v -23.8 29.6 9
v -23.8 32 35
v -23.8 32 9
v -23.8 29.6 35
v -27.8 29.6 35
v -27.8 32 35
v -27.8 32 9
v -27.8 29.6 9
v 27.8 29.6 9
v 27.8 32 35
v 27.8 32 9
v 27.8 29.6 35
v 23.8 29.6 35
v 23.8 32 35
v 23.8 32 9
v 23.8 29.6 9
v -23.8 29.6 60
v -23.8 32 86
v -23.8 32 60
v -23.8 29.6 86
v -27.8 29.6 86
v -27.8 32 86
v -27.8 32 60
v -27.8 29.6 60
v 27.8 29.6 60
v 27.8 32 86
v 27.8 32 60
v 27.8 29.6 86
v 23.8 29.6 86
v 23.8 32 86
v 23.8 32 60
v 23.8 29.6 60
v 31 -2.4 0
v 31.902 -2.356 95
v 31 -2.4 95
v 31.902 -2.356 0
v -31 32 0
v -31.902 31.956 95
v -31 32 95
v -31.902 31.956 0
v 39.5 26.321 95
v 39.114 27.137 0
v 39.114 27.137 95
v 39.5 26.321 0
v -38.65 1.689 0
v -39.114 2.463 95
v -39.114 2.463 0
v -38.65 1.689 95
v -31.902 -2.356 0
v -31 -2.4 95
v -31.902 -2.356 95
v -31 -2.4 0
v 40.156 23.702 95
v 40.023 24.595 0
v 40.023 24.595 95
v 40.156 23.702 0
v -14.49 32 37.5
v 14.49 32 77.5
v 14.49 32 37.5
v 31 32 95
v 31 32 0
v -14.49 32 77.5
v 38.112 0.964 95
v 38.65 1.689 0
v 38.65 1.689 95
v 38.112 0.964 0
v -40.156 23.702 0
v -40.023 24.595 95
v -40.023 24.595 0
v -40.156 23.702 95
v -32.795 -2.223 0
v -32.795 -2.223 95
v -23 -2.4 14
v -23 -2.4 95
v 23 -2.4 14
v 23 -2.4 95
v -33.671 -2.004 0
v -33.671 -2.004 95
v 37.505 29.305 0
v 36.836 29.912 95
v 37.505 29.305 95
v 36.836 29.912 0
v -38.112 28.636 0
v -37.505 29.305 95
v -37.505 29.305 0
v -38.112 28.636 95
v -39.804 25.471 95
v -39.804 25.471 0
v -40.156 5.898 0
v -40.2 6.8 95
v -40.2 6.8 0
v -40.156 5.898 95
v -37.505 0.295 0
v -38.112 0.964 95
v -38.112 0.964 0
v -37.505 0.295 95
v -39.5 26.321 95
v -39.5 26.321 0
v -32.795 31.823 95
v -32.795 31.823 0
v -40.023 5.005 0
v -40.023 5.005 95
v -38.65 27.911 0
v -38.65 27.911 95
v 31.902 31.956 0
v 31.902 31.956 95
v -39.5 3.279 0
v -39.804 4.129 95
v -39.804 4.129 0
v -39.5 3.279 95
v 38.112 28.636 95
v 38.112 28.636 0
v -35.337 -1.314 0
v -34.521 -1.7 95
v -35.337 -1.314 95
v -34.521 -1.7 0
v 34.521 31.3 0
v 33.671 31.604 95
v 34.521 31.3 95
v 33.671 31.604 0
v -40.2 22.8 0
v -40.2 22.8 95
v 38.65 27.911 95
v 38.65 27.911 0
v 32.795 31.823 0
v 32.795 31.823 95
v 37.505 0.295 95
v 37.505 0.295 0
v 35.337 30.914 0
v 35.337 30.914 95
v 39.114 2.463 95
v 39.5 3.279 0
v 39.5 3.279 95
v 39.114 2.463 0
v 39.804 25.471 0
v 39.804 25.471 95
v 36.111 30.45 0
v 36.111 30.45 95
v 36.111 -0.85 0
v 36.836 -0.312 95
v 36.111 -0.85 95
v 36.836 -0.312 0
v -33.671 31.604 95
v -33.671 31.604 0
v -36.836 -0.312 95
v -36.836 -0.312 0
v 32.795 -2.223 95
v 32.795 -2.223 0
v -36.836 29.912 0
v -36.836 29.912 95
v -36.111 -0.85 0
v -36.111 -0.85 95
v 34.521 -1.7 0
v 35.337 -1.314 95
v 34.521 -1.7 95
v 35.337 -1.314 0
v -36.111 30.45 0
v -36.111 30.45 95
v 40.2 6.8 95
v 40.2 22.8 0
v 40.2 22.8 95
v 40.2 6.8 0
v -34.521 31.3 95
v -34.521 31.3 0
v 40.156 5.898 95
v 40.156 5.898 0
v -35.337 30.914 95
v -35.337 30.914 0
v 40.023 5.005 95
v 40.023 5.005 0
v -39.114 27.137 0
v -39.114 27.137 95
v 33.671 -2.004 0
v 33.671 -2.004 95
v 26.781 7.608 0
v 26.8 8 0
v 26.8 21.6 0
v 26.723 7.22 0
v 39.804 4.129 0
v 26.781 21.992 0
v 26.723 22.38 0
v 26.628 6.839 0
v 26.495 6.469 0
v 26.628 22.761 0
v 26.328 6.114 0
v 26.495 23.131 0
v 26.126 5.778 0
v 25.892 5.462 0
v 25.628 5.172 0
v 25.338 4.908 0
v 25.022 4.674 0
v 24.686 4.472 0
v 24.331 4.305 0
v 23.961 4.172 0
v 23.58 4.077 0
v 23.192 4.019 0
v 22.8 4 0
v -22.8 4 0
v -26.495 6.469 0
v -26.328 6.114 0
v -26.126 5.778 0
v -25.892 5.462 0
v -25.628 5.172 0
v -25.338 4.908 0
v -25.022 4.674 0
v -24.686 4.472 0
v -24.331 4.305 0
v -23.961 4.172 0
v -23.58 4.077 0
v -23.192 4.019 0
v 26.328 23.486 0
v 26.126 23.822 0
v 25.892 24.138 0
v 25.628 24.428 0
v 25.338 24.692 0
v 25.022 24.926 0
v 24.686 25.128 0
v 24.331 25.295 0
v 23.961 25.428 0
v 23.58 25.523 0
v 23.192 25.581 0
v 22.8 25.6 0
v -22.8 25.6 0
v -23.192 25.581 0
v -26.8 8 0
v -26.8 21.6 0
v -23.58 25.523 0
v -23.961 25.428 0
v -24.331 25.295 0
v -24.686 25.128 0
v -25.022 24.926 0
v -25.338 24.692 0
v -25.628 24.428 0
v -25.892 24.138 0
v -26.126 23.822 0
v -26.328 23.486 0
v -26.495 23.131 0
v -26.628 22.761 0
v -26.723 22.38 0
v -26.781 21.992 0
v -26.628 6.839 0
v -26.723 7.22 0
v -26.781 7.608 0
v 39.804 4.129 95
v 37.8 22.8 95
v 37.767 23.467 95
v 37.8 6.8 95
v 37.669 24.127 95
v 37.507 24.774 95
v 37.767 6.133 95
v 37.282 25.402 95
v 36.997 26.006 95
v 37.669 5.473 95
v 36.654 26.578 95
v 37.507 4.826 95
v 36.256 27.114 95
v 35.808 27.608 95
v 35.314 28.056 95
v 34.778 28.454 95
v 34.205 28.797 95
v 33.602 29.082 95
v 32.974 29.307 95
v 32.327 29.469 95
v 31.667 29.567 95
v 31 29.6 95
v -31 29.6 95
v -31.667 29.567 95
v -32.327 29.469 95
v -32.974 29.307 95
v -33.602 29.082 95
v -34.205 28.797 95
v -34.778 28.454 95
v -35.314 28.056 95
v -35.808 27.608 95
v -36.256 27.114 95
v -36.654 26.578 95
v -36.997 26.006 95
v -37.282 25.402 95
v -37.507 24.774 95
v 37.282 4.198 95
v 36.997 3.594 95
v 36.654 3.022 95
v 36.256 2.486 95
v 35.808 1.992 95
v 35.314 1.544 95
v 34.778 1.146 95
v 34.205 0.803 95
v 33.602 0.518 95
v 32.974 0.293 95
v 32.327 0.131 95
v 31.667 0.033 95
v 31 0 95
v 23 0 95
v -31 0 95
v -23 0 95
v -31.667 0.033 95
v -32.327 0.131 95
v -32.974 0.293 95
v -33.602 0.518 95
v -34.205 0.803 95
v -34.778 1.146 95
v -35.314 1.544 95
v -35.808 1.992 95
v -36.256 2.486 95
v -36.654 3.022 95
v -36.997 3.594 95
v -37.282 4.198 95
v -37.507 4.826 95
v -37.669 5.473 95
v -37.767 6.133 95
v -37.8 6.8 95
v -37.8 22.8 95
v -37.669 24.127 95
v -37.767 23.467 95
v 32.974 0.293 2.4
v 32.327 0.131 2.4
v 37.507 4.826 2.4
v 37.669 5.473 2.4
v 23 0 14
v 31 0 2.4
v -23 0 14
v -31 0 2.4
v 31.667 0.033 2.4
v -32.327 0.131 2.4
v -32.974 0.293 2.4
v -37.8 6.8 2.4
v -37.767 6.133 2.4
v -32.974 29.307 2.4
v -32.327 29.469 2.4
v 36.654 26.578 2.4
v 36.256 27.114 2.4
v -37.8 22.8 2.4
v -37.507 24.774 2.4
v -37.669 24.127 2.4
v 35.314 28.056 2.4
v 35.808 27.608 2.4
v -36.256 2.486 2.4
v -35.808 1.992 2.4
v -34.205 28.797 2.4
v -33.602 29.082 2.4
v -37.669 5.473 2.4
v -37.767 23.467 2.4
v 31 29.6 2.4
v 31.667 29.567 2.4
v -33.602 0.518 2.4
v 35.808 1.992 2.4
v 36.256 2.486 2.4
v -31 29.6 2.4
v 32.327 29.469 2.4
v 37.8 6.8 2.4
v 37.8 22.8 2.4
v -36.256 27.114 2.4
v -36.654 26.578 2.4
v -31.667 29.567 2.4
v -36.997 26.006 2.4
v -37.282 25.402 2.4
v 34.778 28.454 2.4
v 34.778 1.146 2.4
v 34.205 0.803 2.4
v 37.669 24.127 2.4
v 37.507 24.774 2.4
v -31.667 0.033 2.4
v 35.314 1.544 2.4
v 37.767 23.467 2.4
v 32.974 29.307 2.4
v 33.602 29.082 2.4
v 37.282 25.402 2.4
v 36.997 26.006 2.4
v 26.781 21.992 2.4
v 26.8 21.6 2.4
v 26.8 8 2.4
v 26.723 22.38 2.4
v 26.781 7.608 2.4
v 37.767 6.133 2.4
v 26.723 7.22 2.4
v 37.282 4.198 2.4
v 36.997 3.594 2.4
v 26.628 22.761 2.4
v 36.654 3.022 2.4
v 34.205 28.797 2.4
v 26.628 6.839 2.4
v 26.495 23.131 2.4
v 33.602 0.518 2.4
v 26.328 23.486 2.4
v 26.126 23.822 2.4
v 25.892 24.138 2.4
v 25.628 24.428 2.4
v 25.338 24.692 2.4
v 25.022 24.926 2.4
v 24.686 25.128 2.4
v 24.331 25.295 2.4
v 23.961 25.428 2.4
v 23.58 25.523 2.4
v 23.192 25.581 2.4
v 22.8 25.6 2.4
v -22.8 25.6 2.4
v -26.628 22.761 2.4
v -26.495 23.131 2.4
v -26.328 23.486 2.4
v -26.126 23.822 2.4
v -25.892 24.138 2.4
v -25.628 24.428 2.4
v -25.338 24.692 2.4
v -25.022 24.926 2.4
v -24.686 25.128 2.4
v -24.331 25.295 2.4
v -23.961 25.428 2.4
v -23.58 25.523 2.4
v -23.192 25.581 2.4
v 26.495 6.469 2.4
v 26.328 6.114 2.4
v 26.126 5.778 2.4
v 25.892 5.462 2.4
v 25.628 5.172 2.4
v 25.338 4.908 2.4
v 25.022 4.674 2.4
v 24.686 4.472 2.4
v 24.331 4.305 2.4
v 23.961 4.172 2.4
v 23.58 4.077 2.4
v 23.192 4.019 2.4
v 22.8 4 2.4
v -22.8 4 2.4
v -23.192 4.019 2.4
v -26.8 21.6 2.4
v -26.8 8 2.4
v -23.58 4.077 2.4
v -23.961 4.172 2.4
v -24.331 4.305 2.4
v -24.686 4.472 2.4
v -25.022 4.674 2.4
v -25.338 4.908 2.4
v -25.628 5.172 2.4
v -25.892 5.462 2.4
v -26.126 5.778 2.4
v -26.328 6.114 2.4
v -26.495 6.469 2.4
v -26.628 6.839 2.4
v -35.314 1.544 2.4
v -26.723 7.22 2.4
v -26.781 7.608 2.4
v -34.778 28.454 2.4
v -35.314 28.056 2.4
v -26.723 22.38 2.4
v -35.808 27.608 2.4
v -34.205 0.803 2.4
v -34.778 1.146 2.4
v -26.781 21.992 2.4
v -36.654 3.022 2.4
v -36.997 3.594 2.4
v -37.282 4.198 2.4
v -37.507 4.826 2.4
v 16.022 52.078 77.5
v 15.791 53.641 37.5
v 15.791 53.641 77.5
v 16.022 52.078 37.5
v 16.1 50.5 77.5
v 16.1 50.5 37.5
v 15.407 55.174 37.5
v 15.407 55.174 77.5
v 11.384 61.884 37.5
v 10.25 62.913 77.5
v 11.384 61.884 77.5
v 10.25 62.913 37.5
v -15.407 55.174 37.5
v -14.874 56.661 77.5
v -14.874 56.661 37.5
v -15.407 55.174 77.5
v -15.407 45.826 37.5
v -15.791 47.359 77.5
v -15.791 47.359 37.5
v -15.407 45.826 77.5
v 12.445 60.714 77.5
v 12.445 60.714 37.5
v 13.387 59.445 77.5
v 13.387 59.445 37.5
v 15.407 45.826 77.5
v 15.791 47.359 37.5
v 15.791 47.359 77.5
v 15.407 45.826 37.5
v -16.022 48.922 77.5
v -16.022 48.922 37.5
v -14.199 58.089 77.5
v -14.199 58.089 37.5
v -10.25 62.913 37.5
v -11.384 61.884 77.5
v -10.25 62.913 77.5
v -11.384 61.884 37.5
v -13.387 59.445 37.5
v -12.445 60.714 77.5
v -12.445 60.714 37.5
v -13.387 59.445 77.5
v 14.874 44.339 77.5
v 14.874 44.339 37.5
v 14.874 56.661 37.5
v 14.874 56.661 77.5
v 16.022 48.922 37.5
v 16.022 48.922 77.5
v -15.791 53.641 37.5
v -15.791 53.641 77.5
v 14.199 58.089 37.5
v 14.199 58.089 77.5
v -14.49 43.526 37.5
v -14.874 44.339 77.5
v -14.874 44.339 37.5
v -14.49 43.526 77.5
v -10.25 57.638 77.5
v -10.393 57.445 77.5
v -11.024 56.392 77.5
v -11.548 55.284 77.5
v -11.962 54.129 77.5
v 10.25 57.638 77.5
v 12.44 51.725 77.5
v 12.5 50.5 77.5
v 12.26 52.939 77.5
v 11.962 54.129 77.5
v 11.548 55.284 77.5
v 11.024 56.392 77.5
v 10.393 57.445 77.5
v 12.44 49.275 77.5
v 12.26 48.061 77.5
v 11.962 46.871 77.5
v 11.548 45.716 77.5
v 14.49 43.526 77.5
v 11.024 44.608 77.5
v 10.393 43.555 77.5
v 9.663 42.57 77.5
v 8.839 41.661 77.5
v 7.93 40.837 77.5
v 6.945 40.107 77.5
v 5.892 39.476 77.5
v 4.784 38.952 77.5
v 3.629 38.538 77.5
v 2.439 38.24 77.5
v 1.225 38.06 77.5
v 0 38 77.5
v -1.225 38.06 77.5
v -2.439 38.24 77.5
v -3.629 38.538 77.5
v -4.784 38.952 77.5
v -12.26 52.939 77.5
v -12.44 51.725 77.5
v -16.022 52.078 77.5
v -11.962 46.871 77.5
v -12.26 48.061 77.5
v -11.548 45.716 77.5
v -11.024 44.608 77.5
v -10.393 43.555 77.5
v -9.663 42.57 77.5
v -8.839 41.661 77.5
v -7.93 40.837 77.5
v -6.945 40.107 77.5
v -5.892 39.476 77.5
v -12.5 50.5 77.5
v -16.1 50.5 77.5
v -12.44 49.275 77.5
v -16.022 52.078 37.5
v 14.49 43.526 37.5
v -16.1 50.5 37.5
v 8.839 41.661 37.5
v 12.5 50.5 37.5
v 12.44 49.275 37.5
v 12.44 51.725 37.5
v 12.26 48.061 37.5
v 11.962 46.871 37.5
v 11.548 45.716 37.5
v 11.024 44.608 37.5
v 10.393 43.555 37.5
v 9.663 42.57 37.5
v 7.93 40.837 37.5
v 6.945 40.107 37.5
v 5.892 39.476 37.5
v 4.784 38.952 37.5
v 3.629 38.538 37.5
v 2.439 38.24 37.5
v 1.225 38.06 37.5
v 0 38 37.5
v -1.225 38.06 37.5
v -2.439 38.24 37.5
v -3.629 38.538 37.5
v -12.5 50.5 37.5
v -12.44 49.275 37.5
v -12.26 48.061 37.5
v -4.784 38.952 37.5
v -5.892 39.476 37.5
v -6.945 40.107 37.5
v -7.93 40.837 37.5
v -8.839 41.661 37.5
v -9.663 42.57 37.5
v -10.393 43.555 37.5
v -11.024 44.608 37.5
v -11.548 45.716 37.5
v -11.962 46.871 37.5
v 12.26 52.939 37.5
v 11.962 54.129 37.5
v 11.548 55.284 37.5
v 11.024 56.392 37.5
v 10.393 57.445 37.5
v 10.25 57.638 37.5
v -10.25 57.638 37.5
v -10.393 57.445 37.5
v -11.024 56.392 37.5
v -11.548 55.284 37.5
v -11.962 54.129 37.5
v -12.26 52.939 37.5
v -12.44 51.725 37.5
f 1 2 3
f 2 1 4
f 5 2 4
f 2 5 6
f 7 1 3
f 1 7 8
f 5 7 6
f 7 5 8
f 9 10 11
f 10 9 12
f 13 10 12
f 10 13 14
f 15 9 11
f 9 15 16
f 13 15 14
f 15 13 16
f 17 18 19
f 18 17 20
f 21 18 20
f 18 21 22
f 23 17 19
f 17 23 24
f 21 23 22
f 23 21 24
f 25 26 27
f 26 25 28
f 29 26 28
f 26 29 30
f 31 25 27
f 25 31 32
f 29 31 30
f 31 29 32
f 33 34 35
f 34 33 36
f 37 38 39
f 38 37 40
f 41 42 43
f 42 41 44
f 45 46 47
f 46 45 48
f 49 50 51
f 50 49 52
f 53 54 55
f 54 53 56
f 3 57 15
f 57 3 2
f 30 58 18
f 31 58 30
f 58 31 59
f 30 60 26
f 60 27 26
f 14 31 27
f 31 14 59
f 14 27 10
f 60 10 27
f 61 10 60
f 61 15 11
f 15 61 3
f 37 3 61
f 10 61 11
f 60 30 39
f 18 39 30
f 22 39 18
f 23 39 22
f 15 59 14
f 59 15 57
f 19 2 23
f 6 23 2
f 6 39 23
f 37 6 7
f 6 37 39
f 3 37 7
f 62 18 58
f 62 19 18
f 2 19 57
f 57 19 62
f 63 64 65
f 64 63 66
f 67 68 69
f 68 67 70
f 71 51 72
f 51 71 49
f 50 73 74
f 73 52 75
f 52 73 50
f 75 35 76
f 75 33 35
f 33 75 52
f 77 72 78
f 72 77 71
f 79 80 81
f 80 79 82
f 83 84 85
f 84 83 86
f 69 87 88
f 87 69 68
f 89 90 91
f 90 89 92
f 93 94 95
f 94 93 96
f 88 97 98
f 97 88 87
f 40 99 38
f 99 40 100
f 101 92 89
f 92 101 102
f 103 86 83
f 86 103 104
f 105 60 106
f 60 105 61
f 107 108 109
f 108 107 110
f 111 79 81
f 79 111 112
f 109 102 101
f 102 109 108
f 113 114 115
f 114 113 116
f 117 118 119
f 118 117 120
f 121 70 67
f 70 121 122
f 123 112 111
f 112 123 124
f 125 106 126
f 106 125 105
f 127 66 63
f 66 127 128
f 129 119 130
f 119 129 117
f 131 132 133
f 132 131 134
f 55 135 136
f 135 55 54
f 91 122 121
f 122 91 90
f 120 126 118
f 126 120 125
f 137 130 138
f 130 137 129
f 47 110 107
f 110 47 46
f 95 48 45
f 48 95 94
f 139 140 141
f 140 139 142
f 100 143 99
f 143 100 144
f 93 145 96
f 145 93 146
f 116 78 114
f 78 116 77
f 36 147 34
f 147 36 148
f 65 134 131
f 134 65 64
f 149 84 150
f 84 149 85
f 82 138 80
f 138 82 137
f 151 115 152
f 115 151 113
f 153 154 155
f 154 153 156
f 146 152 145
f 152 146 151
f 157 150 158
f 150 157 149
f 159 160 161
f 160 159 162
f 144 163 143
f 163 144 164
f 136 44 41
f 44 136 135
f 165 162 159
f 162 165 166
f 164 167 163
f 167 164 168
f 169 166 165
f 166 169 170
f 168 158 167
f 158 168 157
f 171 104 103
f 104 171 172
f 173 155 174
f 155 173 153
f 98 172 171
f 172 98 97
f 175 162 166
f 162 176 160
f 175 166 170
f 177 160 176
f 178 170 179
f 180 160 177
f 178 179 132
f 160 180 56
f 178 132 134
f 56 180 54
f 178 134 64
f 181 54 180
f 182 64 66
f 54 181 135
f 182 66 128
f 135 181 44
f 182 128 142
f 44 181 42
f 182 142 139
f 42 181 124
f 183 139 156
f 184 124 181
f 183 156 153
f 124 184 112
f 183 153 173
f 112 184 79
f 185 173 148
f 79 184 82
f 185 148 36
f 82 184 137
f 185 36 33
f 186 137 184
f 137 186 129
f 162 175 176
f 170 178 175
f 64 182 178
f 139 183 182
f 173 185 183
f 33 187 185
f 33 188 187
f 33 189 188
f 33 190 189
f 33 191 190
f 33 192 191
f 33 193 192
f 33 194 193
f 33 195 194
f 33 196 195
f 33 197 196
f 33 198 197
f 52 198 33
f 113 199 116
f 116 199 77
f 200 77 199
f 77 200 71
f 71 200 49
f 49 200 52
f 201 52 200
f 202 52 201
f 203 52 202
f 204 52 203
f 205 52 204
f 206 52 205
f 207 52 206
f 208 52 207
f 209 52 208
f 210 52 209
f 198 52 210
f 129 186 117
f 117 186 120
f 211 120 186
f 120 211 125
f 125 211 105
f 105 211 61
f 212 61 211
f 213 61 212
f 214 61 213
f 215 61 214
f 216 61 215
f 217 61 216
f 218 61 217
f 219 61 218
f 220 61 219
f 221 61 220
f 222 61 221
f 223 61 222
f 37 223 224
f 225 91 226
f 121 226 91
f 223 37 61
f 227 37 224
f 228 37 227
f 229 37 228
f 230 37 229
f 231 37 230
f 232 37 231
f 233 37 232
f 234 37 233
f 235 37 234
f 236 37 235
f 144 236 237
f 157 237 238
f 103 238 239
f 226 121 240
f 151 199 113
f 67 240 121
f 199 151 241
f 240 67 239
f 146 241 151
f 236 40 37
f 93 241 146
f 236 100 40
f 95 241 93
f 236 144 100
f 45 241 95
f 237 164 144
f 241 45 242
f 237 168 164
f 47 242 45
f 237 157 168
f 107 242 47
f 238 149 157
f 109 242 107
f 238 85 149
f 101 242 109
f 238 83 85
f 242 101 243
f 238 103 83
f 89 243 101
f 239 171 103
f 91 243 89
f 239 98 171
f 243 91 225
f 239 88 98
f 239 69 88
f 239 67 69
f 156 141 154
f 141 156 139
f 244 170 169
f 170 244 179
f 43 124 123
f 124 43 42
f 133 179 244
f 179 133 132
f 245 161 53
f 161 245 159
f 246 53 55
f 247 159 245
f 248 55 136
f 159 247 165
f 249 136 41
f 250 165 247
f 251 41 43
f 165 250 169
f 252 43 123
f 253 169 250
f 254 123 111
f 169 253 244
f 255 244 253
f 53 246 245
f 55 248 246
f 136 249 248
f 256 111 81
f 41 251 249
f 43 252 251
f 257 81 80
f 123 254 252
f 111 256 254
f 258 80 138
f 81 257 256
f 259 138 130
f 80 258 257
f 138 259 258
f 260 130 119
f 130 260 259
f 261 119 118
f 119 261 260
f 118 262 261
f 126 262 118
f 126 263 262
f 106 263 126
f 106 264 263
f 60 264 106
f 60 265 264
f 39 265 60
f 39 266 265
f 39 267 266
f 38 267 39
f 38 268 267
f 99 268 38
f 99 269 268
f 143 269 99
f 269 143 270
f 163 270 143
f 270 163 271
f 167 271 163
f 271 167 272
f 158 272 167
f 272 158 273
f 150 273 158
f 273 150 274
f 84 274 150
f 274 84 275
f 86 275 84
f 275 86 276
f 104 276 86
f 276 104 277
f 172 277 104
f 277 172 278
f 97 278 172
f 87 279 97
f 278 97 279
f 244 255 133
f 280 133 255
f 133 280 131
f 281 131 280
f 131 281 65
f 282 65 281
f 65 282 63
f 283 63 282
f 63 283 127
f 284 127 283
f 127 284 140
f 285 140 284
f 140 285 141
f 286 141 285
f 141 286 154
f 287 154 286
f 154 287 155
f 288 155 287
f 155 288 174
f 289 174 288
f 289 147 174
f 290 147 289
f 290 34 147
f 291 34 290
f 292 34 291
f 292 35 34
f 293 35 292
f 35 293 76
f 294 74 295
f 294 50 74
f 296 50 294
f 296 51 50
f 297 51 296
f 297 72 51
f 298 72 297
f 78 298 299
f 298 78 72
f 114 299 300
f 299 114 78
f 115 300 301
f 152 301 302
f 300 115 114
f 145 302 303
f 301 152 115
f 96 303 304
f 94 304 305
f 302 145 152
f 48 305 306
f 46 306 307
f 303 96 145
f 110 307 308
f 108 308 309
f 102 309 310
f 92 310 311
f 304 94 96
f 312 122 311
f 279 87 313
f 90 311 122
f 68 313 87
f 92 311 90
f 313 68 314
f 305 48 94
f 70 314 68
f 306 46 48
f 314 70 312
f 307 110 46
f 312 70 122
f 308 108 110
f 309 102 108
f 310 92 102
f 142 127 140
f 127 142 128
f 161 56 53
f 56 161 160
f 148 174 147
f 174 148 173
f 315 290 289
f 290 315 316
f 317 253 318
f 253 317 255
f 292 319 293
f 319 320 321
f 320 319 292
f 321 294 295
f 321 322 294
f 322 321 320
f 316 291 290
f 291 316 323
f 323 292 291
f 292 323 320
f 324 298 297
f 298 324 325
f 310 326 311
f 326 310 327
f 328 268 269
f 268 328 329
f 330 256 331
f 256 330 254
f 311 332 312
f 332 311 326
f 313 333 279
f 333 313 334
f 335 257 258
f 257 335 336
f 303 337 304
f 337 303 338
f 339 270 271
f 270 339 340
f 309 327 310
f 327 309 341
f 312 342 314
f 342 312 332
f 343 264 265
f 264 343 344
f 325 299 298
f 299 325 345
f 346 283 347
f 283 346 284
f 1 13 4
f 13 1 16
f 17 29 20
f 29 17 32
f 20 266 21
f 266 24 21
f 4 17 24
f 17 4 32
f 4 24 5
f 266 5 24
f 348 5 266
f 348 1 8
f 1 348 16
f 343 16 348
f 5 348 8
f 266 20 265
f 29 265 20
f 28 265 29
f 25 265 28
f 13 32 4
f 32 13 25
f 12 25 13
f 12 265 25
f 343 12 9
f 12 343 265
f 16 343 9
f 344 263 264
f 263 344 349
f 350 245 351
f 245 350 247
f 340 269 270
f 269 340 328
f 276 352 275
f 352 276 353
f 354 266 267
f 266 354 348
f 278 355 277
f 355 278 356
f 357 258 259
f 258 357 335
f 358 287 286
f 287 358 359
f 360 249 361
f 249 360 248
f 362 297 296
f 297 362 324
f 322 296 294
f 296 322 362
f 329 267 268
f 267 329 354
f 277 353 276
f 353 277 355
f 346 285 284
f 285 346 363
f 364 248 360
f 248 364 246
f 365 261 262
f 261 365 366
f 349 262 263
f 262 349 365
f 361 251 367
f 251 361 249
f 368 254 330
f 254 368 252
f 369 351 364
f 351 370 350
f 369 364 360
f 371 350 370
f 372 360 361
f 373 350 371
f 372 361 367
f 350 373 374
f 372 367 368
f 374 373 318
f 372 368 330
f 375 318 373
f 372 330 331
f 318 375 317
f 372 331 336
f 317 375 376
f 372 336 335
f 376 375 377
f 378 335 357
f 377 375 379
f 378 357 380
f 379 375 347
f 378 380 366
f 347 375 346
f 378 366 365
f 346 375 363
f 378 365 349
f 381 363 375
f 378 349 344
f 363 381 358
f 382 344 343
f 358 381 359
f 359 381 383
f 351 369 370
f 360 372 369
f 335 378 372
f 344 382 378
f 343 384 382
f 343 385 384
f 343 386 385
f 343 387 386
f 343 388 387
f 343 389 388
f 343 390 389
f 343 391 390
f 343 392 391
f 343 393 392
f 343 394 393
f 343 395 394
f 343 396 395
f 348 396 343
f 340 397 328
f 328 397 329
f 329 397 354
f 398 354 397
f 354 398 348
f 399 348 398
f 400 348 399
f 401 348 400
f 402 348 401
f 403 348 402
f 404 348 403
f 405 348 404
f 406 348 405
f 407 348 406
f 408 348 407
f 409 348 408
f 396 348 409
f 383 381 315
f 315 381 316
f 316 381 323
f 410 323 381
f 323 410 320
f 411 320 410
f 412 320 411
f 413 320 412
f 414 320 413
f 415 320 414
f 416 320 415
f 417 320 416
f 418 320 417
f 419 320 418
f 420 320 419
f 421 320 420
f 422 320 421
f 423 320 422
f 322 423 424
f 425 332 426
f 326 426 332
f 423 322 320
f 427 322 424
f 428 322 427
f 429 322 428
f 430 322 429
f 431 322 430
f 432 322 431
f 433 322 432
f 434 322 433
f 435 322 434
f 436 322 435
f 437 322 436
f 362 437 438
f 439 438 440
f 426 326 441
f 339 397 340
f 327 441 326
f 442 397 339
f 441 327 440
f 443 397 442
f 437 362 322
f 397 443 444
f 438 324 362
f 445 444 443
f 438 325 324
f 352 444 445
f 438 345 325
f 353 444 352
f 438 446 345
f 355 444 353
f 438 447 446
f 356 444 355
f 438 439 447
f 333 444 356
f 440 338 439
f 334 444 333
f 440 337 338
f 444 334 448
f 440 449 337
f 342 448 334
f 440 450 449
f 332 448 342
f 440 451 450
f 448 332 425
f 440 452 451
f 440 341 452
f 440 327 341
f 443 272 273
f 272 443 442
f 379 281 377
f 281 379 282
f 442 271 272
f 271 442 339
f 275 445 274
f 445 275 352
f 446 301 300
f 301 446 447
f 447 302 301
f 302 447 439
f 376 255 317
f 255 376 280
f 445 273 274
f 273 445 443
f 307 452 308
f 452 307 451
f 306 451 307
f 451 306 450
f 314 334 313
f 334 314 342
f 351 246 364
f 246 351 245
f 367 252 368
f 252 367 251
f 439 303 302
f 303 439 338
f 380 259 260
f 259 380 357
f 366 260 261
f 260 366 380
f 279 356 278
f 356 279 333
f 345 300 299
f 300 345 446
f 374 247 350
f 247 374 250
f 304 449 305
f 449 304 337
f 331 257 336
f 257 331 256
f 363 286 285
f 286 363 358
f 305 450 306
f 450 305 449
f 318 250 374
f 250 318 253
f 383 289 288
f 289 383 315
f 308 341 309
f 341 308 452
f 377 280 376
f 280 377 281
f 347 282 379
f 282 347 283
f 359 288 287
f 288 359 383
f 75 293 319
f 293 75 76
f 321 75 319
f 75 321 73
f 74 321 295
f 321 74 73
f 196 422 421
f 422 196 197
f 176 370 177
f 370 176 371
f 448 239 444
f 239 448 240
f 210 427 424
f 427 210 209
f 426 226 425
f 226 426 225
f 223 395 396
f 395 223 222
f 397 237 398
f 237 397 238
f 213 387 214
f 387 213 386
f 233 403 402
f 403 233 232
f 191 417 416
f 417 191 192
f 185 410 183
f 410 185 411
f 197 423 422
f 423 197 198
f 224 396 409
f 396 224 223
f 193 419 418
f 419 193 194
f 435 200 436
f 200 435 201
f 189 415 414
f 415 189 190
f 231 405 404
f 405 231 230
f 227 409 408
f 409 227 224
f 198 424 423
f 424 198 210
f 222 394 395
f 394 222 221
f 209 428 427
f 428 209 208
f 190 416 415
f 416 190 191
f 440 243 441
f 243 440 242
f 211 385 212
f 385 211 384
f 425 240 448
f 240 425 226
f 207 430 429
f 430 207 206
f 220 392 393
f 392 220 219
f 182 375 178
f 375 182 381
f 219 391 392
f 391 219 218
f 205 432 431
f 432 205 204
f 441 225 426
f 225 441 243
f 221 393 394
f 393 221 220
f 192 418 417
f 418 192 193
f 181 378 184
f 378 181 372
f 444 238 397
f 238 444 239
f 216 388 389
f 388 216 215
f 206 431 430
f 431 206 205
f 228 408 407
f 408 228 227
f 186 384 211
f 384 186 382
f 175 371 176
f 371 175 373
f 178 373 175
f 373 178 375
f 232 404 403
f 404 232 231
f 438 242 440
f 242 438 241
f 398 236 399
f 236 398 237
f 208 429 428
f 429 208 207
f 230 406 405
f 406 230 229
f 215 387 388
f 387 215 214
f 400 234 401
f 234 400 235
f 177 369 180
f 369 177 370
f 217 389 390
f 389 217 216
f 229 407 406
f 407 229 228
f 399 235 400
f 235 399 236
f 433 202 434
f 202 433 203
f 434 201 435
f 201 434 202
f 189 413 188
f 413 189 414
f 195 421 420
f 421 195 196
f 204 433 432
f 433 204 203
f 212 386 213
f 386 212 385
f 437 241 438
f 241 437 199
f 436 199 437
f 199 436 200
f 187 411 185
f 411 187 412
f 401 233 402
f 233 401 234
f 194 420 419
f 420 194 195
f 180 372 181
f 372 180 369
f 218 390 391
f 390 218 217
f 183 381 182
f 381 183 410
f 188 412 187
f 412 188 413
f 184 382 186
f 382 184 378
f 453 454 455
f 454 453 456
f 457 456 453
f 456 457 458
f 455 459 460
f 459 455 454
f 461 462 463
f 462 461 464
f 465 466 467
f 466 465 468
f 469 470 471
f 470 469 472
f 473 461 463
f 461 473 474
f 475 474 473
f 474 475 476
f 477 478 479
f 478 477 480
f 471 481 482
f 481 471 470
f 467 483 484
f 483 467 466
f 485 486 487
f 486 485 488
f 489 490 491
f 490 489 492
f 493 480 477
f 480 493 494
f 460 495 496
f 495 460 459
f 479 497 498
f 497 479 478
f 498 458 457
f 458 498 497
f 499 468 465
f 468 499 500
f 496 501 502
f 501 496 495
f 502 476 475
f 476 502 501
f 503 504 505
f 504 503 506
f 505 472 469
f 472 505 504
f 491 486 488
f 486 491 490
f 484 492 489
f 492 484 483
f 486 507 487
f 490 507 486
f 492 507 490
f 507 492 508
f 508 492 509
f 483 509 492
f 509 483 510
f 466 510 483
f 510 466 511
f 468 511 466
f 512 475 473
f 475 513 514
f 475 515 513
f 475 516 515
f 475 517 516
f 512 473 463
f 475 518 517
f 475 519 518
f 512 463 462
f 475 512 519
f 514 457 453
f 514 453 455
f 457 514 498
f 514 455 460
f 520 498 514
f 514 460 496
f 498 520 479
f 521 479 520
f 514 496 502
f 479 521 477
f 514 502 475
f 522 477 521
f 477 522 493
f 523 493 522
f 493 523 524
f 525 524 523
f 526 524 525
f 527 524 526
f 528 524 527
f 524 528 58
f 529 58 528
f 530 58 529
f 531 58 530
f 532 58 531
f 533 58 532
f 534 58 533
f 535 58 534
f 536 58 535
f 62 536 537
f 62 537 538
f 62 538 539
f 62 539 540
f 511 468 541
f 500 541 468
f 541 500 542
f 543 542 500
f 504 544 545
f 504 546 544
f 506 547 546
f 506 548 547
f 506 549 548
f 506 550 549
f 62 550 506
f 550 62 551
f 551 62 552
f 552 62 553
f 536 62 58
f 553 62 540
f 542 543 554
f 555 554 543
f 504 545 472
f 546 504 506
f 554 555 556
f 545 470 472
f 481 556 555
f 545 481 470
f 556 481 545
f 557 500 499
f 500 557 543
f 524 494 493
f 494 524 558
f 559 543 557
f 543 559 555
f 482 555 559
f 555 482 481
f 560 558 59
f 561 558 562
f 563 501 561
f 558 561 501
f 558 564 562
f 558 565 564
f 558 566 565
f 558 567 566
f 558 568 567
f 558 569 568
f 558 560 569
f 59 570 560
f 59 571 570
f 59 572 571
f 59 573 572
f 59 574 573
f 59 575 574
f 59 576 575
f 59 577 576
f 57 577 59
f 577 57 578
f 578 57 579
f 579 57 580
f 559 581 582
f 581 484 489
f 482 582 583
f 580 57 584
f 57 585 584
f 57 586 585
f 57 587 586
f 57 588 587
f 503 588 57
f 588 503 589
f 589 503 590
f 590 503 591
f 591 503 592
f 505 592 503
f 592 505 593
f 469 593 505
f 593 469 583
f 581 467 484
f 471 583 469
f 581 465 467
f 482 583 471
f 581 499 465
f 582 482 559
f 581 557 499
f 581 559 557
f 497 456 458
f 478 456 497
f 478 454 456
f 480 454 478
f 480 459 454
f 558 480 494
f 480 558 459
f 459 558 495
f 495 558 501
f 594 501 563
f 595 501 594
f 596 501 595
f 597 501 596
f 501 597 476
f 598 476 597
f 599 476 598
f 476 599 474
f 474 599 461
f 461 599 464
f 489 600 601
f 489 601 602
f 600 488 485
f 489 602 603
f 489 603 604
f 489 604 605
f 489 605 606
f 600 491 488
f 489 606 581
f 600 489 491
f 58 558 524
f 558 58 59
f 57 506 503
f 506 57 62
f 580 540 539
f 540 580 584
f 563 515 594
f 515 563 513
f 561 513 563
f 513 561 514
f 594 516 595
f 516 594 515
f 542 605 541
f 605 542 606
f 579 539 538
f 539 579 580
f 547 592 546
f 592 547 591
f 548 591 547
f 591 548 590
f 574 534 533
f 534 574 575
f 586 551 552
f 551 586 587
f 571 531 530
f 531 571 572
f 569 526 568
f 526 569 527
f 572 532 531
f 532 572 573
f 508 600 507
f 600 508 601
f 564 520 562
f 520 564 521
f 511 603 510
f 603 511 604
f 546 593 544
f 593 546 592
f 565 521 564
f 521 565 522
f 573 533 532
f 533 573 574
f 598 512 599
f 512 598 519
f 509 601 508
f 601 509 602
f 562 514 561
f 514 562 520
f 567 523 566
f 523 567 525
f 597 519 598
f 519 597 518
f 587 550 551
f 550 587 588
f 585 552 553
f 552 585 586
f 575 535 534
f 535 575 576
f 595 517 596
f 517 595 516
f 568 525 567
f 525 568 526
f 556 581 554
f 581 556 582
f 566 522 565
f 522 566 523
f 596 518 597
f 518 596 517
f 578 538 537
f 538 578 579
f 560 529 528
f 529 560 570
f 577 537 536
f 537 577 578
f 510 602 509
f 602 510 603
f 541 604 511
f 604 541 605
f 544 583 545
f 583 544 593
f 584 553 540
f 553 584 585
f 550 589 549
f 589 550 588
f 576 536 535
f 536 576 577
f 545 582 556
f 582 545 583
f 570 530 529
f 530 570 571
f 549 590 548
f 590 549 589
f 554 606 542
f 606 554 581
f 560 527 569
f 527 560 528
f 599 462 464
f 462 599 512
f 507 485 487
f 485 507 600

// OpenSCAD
// Suporte para pendurar o power bank Xiaomi Mi 50W 20000mAh (PB2050SZM) em um tripé.
//
// O power bank fica em pé dentro de um "berço" aberto em cima (portas para cima)
// e o berço prende no tripé de uma destas formas (escolha em `fixacao`):
//   "clip"   - abraçadeira de encaixe (snap) para tubo redondo: coluna central do tripé.
//              Ele pode ficar apoiado em cima do anel onde se prendem as hastes/braços.
//   "gancho" - gancho em U invertido para pendurar numa haste, braço ou barra.
//   "nenhum" - só o berço, com rasgos para passar fita de velcro/abraçadeira.
// Os rasgos de velcro existem em todas as versões, como reforço.
//
// MEÇA SEU TRIPÉ com paquímetro e ajuste `diametro_tubo` / `vao_gancho` antes de imprimir.

/* [Fixação] */
fixacao = "clip";        // ["clip", "gancho", "nenhum"]
diametro_tubo = 25;      // diâmetro da coluna central (mm) - MEDIR
altura_clip = 40;        // altura da abraçadeira
abertura_clip = 0.82;    // abertura da boca do clip, fração do diâmetro (menor = aperta mais)
vao_gancho = 26;         // vão interno do gancho (largura da haste/barra onde pendura)
profundidade_gancho = 30;// quanto o gancho desce do lado de trás

/* [Power bank - medidas oficiais 154 x 74 x 28 mm] */
pb_largura   = 74;
pb_espessura = 28;
pb_raio      = 6;        // raio dos cantos arredondados
folga        = 0.8;      // folga por lado (PETG/PLA: 0.6 a 1.0)

/* [Berço] */
parede      = 2.4;
fundo       = 2.4;
altura_berco = 95;       // o power bank tem 154 mm: sobram ~60 mm para fora (portas e LEDs livres)
janela_larg = 46;        // janela frontal (mostra o logo e deixa empurrar para tirar)
janela_base = 14;

$fn = 64;

iw = pb_largura + 2*folga;
it = pb_espessura + 2*folga;
ir = pb_raio + folga;
ow = iw + 2*parede;
ot = it + 2*parede;
orad = ir + parede;

module rrect(w, t, r, h) {
    // retângulo arredondado centrado em X, de y=0 a y=t
    translate([0, t/2, 0]) linear_extrude(h)
        offset(r=r) square([w - 2*r, t - 2*r], center=true);
}

module berco() {
    difference() {
        translate([0, -parede, 0]) rrect(ow, ot, orad, altura_berco);
        // cavidade
        translate([0, 0, fundo]) rrect(iw, it, ir, altura_berco);
        // janela frontal em U, aberta em cima
        translate([-janela_larg/2, -parede - 1, janela_base])
            cube([janela_larg, parede + 2, altura_berco]);
        // furo no fundo: ventilação e para empurrar o power bank para cima
        translate([0, it/2, -1]) linear_extrude(fundo + 2)
            offset(r=4) square([iw - 30, it - 16], center=true);
        // rasgos para velcro na parede traseira (2 alturas)
        for (z = [22, altura_berco - 22])
            for (s = [-1, 1])
                translate([s*(iw/2 - 12) - 2, it - 1, z - 13])
                    cube([4, parede + 2, 26]);
    }
}

// ---------- clip para tubo redondo ----------
module clip() {
    r_in  = diametro_tubo/2;
    esp   = 3.6;
    r_out = r_in + esp;
    boca  = diametro_tubo * abertura_clip;
    base  = 6;                         // distância entre o berço e o tubo
    cy    = it + parede + base + r_in; // centro do tubo
    z0    = (altura_berco - altura_clip) / 2 + 10;
    translate([0, 0, z0]) {
        difference() {
            union() {
                translate([0, cy, 0]) cylinder(r=r_out, h=altura_clip);
                // pescoço que liga o anel ao berço
                translate([-(r_out*0.9), it + parede - 0.5, 0])
                    cube([2*r_out*0.9, base + r_in*0.5, altura_clip]);
            }
            translate([0, cy, -1]) cylinder(r=r_in, h=altura_clip + 2);
            // boca do clip (lado oposto ao berço)
            translate([-boca/2, cy, -1]) cube([boca, r_out + 2, altura_clip + 2]);
        }
    }
}

// ---------- gancho em U invertido ----------
module gancho() {
    larg = 34;       // largura do gancho (eixo X)
    e    = 5;        // espessura do perfil
    ztop = altura_berco + 8;         // altura do topo interno do gancho
    // perfil 2D em (Y, Z) extrudado ao longo de X
    translate([-larg/2, 0, 0]) rotate([90, 0, 90]) linear_extrude(larg) {
        // subida: prolonga a parede traseira acima do berço
        translate([it, altura_berco - 30]) square([e, ztop - altura_berco + 30 + e]);
        // topo (passa por cima da barra)
        translate([it, ztop]) square([vao_gancho + 2*e, e]);
        // aba que desce atrás da barra, com ponta arredondada
        translate([it + e + vao_gancho, ztop - profundidade_gancho]) square([e, profundidade_gancho + e]);
        translate([it + e + vao_gancho + e/2, ztop - profundidade_gancho]) circle(d=e);
    }
}

berco();
if (fixacao == "clip")   clip();
if (fixacao == "gancho") gancho();
